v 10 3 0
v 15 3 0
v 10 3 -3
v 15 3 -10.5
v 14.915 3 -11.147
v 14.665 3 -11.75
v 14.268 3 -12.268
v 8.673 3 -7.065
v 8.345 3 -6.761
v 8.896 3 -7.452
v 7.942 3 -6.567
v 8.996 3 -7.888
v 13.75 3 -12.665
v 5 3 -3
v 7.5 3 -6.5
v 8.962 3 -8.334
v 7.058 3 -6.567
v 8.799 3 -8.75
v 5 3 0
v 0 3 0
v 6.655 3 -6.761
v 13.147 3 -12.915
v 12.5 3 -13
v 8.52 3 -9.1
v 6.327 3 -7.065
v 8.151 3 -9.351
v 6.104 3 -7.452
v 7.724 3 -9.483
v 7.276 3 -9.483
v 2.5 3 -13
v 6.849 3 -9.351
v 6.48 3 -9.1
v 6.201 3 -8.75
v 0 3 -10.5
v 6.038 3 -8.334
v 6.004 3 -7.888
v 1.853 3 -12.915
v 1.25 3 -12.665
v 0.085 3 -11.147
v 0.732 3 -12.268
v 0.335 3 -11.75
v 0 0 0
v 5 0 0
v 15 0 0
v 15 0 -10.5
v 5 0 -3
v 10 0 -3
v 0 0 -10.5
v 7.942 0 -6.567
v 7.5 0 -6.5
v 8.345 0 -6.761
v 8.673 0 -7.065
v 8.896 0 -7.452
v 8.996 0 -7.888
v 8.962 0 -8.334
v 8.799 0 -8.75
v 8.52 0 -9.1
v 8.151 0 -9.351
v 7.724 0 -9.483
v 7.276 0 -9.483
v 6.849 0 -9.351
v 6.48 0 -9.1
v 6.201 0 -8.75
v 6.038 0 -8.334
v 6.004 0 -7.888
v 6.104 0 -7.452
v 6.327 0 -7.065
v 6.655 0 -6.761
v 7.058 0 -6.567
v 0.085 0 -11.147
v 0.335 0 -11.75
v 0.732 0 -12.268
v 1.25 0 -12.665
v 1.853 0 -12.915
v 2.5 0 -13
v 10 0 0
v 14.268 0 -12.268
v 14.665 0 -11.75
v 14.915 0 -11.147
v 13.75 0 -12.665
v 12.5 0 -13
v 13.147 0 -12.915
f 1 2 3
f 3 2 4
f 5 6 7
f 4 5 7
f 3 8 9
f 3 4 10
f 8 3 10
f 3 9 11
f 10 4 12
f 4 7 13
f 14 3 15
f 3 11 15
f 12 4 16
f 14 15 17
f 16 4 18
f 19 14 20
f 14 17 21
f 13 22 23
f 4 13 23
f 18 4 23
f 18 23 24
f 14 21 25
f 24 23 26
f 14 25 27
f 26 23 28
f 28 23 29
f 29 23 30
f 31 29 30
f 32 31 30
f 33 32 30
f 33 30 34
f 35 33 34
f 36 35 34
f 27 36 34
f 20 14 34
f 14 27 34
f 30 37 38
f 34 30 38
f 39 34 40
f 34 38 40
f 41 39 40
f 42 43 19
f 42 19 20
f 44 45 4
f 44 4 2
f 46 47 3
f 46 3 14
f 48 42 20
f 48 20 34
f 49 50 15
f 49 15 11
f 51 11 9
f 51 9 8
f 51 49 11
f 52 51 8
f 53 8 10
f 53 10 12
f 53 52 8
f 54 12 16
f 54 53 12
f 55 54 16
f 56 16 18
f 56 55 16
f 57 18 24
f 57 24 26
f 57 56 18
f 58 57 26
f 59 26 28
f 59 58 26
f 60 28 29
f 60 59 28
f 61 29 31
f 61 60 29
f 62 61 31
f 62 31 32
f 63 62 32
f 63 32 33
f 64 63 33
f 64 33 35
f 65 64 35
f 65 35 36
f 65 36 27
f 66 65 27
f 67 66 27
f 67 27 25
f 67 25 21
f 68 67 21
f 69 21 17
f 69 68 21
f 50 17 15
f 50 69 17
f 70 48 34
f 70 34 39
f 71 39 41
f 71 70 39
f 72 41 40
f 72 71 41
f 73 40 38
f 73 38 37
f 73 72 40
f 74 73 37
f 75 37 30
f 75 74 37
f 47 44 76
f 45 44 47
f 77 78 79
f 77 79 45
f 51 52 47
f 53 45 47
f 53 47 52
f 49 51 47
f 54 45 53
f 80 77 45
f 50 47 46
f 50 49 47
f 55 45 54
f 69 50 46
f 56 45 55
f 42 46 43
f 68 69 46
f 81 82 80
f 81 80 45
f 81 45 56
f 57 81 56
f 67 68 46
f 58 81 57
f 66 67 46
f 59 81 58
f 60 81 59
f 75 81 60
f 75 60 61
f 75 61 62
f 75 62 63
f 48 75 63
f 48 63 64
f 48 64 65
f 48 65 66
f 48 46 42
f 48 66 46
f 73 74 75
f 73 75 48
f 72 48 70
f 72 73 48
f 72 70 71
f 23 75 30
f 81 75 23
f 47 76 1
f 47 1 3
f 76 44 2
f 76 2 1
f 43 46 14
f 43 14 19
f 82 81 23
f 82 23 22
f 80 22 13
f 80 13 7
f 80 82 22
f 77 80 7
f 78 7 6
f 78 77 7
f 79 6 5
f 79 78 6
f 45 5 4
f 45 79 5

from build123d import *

# Parameters (mm, degrees)
SKETCH1_R           = 1.5
BOSS_EXTRUDE1_DEPTH = 3


with BuildPart() as part:
    # Sketch1 → Boss-Extrude1 (new body)
    with BuildSketch(Plane(origin=(0, 0, 0), x_dir=(1, 0, 0), z_dir=(0, 1, 0))):
        with BuildLine():
            Line((0, 0), (0, 10.5))
            ThreePointArc((0, 10.5), (0.732233047, 12.267766953), (2.5, 13))
            Line((2.5, 13), (12.5, 13))
            ThreePointArc((12.5, 13), (14.267766953, 12.267766953), (15, 10.5))
            Line((15, 10.5), (15, 0))
            Line((15, 0), (10, 0))
            Line((10, 0), (10, 3))
            Line((10, 3), (5, 3))
            Line((5, 3), (5, 0))
            Line((5, 0), (0, 0))
        make_face()
        with Locations(Location((7.5, 8, 0), (0, 0, 270))):
            Circle(SKETCH1_R, mode=Mode.SUBTRACT)
    extrude(amount=BOSS_EXTRUDE1_DEPTH)


solid = part.part
